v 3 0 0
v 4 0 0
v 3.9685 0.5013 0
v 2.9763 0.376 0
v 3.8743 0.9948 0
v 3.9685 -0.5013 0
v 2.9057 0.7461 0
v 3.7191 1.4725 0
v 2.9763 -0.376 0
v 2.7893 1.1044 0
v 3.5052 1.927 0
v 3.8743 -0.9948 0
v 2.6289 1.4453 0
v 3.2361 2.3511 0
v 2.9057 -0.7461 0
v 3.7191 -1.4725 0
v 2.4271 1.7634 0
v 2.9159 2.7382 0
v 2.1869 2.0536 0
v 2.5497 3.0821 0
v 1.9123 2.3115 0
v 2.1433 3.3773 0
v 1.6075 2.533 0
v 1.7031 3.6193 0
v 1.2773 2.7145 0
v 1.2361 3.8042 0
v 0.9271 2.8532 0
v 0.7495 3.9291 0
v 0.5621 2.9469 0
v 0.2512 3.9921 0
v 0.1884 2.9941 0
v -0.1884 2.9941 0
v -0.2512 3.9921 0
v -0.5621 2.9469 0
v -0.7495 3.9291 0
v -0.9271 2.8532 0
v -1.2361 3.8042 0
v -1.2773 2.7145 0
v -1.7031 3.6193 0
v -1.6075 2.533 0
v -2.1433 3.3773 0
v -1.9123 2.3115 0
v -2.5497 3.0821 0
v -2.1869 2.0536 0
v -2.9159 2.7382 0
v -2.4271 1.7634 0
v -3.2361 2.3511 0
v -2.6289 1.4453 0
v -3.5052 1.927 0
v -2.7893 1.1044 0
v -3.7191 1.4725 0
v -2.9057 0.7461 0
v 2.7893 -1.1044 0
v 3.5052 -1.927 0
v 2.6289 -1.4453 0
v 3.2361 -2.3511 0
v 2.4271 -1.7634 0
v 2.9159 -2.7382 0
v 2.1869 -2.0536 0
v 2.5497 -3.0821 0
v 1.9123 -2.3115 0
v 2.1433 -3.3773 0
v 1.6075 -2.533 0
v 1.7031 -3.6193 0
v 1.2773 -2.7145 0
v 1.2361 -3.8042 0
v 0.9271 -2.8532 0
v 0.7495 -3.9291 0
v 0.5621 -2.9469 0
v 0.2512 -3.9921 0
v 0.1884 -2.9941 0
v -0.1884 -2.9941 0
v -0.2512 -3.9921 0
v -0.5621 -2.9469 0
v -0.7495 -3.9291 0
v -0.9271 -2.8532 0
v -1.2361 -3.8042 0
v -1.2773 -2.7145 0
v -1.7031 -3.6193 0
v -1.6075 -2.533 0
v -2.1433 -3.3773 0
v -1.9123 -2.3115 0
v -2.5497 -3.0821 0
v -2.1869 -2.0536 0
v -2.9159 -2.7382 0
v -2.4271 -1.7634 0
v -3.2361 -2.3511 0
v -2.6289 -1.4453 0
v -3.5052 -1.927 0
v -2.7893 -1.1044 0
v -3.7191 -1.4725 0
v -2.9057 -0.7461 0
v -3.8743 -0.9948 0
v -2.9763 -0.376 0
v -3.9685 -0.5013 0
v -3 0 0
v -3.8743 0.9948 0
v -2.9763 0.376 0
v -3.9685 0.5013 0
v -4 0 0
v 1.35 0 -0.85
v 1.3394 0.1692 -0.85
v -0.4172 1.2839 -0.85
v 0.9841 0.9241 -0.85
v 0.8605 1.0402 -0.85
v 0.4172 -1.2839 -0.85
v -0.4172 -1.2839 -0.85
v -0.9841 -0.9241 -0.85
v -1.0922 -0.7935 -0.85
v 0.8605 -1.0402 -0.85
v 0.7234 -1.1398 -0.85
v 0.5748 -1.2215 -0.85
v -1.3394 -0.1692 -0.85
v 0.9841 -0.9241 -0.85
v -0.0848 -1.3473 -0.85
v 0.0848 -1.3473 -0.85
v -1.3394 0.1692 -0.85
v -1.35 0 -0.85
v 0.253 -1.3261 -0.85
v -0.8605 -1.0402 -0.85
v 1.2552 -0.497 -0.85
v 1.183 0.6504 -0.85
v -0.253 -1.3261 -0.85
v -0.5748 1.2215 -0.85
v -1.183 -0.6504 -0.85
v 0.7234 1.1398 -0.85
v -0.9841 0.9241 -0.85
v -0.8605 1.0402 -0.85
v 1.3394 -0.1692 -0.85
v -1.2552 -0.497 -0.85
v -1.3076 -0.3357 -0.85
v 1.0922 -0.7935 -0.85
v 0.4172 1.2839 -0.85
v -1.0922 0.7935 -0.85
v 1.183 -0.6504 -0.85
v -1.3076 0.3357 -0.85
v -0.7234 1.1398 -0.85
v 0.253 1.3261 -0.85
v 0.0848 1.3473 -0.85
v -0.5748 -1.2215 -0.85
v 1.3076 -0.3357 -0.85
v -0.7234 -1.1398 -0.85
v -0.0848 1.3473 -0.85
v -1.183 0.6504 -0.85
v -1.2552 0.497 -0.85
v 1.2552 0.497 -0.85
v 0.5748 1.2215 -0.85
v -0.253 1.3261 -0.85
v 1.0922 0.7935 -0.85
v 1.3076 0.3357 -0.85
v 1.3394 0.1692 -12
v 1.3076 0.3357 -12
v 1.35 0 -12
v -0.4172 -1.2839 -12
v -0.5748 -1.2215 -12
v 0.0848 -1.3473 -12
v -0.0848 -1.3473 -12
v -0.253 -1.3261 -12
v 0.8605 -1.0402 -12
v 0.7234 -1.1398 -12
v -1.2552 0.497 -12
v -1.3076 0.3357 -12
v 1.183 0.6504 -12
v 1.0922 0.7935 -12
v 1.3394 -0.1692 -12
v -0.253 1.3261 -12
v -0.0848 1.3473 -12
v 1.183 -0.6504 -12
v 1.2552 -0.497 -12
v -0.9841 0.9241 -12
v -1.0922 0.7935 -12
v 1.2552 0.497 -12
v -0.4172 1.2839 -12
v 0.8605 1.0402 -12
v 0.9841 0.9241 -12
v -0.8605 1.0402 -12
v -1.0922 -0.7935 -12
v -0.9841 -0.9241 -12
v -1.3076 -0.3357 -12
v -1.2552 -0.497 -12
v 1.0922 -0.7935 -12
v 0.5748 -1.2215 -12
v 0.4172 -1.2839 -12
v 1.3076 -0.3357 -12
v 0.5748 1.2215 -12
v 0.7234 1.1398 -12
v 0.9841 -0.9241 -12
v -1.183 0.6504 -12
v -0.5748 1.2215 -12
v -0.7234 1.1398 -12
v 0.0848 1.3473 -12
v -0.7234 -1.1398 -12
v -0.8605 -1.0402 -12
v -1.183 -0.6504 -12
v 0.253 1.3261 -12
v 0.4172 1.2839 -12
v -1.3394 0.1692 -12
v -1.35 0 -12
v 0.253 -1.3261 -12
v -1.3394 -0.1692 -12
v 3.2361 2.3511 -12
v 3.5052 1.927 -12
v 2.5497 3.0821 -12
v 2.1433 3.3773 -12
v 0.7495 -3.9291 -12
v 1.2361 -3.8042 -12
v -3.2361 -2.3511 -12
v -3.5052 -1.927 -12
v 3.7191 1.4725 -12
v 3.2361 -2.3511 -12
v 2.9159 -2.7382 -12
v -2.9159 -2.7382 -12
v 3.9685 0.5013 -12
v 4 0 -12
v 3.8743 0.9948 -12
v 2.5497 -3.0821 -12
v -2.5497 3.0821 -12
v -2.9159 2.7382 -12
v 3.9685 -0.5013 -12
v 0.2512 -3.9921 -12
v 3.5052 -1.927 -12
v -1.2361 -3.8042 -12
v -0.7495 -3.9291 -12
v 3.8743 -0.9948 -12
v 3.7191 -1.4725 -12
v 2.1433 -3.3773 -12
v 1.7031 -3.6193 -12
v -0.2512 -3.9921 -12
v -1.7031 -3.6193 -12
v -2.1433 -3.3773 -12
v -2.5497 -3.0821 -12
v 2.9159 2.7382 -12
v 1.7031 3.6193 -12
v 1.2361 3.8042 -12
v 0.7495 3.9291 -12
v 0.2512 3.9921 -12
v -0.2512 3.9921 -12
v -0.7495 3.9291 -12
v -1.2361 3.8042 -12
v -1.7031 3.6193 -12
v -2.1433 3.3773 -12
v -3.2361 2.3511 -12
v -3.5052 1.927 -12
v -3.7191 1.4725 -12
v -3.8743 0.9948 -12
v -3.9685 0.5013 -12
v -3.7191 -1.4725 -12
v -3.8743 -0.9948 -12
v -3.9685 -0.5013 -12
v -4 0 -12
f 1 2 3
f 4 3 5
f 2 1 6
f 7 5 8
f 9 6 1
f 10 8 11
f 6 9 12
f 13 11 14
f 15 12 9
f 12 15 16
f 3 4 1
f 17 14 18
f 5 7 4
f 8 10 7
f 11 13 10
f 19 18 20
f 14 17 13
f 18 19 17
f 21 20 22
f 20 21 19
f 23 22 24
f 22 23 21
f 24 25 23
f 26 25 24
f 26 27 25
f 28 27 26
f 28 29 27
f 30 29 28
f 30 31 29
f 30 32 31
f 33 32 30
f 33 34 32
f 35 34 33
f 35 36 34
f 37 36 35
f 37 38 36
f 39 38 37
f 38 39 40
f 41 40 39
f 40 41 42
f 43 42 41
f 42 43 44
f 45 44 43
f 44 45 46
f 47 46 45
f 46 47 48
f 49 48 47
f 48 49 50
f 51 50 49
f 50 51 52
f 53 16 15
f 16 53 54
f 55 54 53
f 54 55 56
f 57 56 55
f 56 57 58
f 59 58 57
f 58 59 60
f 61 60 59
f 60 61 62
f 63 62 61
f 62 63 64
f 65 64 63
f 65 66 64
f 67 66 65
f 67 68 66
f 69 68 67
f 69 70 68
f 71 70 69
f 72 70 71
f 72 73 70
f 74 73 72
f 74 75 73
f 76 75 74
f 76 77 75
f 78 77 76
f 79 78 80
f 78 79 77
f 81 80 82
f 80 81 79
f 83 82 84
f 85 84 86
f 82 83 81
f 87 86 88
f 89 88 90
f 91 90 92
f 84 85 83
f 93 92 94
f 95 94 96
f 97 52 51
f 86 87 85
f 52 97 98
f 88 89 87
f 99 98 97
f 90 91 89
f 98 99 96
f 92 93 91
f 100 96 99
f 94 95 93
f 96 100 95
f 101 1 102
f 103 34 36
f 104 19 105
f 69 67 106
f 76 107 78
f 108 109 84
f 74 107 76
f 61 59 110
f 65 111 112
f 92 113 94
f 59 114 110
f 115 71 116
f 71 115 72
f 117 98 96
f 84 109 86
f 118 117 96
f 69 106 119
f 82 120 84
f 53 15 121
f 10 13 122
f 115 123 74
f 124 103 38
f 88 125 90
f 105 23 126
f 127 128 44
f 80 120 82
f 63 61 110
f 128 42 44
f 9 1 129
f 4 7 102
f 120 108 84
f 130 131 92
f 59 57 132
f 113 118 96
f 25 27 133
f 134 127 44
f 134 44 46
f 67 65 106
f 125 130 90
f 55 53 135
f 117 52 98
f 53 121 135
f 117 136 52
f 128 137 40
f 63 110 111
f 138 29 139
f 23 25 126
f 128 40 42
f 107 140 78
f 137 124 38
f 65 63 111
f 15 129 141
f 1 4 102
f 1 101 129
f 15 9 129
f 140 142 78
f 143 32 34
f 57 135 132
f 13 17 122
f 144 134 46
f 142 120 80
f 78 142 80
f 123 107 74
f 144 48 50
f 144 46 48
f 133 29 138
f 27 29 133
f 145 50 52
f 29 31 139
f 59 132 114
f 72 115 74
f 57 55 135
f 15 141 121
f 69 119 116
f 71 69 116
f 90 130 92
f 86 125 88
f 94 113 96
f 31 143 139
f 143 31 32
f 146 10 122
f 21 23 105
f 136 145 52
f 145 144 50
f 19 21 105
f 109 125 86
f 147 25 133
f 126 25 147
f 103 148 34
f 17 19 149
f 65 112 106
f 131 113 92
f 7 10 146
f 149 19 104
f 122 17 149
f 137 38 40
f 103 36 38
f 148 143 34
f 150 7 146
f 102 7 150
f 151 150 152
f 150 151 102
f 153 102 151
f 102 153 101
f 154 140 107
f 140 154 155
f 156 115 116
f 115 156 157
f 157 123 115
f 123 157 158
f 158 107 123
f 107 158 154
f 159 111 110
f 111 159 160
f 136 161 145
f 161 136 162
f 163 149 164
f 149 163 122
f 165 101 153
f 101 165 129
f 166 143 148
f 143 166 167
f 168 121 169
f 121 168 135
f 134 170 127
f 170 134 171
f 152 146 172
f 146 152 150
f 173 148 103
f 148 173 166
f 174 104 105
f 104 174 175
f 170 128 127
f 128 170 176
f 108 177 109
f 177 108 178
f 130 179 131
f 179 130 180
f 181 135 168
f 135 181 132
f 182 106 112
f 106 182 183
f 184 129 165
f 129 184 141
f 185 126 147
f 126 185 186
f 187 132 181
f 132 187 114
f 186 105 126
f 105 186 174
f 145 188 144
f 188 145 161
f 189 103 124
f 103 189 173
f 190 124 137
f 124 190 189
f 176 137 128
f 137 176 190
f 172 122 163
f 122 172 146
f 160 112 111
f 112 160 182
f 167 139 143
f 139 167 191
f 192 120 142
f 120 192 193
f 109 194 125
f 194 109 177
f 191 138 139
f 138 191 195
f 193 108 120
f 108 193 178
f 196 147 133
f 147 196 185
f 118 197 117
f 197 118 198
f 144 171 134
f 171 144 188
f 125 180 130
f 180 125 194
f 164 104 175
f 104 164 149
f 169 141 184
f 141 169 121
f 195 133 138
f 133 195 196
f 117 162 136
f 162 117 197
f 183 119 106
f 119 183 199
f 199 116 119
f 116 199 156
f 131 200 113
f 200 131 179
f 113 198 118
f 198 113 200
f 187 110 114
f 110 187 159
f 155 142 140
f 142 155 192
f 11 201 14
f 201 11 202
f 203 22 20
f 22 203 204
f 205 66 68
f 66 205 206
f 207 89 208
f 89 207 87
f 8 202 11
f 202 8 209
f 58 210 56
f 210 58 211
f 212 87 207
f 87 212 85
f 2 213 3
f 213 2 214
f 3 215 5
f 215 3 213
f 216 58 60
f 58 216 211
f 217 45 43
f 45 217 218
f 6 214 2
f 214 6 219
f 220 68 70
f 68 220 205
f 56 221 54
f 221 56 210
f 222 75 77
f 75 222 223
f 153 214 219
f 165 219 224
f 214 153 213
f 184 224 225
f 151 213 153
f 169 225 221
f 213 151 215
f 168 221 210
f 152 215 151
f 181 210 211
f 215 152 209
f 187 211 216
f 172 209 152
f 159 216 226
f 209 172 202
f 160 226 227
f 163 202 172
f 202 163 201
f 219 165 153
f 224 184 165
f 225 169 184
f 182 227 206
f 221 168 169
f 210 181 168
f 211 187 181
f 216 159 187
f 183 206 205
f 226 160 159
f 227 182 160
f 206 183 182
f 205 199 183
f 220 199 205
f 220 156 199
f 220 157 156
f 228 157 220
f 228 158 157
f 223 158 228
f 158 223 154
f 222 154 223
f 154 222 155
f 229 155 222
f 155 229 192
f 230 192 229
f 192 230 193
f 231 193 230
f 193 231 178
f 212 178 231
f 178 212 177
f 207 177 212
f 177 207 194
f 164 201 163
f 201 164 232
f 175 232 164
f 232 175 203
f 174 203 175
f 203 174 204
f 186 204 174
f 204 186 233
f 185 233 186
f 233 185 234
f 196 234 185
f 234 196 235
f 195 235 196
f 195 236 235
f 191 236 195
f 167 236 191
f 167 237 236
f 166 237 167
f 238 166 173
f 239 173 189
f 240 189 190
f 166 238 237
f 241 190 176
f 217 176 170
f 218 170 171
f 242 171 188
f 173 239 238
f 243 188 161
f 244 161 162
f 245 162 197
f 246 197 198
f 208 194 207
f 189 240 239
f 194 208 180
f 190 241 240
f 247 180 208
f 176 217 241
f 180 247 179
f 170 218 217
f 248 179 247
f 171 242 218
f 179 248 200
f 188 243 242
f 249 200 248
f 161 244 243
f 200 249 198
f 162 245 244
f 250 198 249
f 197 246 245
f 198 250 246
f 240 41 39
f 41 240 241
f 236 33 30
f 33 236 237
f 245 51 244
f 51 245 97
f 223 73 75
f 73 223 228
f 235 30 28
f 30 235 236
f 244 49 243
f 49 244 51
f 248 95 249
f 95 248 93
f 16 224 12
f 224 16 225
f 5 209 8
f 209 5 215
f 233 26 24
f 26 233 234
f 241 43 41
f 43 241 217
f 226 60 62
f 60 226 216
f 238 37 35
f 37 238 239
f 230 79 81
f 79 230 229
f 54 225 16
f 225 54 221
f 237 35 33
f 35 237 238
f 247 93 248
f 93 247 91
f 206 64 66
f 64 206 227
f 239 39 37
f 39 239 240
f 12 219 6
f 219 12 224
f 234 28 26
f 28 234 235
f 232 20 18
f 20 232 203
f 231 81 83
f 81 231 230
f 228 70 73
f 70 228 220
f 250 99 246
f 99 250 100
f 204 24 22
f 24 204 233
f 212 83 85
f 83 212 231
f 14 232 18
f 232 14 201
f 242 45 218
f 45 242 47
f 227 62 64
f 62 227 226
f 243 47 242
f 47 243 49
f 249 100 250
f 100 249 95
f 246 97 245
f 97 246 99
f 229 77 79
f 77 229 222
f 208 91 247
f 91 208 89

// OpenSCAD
$fn = 50;

difference() {
	union() {
		translate(v = [0, 0, -12.0]) {
			cylinder(h = 15, r = 4.0);
		}
	}
	union() {
		translate(v = [0, 0, 0]) {
			rotate(a = [0, 0, 0]) {
				difference() {
					union() {
						translate(v = [0, 0, -15.0]) {
							cylinder(h = 15, r = 1.0);
						}
						translate(v = [0, 0, -0.85]) {
							cylinder(h = 0.85, r1 = 1.35, r2 = 3.0);
						}
						translate(v = [0, 0, -15.0]) {
							cylinder(h = 15, r = 1.35);
						}
						translate(v = [0, 0, -15.0]) {
							cylinder(h = 15, r = 1.0);
						}
					}
					union();
				}
			}
		}
		#cylinder(h = 3, r = 5.0);
	}
}
